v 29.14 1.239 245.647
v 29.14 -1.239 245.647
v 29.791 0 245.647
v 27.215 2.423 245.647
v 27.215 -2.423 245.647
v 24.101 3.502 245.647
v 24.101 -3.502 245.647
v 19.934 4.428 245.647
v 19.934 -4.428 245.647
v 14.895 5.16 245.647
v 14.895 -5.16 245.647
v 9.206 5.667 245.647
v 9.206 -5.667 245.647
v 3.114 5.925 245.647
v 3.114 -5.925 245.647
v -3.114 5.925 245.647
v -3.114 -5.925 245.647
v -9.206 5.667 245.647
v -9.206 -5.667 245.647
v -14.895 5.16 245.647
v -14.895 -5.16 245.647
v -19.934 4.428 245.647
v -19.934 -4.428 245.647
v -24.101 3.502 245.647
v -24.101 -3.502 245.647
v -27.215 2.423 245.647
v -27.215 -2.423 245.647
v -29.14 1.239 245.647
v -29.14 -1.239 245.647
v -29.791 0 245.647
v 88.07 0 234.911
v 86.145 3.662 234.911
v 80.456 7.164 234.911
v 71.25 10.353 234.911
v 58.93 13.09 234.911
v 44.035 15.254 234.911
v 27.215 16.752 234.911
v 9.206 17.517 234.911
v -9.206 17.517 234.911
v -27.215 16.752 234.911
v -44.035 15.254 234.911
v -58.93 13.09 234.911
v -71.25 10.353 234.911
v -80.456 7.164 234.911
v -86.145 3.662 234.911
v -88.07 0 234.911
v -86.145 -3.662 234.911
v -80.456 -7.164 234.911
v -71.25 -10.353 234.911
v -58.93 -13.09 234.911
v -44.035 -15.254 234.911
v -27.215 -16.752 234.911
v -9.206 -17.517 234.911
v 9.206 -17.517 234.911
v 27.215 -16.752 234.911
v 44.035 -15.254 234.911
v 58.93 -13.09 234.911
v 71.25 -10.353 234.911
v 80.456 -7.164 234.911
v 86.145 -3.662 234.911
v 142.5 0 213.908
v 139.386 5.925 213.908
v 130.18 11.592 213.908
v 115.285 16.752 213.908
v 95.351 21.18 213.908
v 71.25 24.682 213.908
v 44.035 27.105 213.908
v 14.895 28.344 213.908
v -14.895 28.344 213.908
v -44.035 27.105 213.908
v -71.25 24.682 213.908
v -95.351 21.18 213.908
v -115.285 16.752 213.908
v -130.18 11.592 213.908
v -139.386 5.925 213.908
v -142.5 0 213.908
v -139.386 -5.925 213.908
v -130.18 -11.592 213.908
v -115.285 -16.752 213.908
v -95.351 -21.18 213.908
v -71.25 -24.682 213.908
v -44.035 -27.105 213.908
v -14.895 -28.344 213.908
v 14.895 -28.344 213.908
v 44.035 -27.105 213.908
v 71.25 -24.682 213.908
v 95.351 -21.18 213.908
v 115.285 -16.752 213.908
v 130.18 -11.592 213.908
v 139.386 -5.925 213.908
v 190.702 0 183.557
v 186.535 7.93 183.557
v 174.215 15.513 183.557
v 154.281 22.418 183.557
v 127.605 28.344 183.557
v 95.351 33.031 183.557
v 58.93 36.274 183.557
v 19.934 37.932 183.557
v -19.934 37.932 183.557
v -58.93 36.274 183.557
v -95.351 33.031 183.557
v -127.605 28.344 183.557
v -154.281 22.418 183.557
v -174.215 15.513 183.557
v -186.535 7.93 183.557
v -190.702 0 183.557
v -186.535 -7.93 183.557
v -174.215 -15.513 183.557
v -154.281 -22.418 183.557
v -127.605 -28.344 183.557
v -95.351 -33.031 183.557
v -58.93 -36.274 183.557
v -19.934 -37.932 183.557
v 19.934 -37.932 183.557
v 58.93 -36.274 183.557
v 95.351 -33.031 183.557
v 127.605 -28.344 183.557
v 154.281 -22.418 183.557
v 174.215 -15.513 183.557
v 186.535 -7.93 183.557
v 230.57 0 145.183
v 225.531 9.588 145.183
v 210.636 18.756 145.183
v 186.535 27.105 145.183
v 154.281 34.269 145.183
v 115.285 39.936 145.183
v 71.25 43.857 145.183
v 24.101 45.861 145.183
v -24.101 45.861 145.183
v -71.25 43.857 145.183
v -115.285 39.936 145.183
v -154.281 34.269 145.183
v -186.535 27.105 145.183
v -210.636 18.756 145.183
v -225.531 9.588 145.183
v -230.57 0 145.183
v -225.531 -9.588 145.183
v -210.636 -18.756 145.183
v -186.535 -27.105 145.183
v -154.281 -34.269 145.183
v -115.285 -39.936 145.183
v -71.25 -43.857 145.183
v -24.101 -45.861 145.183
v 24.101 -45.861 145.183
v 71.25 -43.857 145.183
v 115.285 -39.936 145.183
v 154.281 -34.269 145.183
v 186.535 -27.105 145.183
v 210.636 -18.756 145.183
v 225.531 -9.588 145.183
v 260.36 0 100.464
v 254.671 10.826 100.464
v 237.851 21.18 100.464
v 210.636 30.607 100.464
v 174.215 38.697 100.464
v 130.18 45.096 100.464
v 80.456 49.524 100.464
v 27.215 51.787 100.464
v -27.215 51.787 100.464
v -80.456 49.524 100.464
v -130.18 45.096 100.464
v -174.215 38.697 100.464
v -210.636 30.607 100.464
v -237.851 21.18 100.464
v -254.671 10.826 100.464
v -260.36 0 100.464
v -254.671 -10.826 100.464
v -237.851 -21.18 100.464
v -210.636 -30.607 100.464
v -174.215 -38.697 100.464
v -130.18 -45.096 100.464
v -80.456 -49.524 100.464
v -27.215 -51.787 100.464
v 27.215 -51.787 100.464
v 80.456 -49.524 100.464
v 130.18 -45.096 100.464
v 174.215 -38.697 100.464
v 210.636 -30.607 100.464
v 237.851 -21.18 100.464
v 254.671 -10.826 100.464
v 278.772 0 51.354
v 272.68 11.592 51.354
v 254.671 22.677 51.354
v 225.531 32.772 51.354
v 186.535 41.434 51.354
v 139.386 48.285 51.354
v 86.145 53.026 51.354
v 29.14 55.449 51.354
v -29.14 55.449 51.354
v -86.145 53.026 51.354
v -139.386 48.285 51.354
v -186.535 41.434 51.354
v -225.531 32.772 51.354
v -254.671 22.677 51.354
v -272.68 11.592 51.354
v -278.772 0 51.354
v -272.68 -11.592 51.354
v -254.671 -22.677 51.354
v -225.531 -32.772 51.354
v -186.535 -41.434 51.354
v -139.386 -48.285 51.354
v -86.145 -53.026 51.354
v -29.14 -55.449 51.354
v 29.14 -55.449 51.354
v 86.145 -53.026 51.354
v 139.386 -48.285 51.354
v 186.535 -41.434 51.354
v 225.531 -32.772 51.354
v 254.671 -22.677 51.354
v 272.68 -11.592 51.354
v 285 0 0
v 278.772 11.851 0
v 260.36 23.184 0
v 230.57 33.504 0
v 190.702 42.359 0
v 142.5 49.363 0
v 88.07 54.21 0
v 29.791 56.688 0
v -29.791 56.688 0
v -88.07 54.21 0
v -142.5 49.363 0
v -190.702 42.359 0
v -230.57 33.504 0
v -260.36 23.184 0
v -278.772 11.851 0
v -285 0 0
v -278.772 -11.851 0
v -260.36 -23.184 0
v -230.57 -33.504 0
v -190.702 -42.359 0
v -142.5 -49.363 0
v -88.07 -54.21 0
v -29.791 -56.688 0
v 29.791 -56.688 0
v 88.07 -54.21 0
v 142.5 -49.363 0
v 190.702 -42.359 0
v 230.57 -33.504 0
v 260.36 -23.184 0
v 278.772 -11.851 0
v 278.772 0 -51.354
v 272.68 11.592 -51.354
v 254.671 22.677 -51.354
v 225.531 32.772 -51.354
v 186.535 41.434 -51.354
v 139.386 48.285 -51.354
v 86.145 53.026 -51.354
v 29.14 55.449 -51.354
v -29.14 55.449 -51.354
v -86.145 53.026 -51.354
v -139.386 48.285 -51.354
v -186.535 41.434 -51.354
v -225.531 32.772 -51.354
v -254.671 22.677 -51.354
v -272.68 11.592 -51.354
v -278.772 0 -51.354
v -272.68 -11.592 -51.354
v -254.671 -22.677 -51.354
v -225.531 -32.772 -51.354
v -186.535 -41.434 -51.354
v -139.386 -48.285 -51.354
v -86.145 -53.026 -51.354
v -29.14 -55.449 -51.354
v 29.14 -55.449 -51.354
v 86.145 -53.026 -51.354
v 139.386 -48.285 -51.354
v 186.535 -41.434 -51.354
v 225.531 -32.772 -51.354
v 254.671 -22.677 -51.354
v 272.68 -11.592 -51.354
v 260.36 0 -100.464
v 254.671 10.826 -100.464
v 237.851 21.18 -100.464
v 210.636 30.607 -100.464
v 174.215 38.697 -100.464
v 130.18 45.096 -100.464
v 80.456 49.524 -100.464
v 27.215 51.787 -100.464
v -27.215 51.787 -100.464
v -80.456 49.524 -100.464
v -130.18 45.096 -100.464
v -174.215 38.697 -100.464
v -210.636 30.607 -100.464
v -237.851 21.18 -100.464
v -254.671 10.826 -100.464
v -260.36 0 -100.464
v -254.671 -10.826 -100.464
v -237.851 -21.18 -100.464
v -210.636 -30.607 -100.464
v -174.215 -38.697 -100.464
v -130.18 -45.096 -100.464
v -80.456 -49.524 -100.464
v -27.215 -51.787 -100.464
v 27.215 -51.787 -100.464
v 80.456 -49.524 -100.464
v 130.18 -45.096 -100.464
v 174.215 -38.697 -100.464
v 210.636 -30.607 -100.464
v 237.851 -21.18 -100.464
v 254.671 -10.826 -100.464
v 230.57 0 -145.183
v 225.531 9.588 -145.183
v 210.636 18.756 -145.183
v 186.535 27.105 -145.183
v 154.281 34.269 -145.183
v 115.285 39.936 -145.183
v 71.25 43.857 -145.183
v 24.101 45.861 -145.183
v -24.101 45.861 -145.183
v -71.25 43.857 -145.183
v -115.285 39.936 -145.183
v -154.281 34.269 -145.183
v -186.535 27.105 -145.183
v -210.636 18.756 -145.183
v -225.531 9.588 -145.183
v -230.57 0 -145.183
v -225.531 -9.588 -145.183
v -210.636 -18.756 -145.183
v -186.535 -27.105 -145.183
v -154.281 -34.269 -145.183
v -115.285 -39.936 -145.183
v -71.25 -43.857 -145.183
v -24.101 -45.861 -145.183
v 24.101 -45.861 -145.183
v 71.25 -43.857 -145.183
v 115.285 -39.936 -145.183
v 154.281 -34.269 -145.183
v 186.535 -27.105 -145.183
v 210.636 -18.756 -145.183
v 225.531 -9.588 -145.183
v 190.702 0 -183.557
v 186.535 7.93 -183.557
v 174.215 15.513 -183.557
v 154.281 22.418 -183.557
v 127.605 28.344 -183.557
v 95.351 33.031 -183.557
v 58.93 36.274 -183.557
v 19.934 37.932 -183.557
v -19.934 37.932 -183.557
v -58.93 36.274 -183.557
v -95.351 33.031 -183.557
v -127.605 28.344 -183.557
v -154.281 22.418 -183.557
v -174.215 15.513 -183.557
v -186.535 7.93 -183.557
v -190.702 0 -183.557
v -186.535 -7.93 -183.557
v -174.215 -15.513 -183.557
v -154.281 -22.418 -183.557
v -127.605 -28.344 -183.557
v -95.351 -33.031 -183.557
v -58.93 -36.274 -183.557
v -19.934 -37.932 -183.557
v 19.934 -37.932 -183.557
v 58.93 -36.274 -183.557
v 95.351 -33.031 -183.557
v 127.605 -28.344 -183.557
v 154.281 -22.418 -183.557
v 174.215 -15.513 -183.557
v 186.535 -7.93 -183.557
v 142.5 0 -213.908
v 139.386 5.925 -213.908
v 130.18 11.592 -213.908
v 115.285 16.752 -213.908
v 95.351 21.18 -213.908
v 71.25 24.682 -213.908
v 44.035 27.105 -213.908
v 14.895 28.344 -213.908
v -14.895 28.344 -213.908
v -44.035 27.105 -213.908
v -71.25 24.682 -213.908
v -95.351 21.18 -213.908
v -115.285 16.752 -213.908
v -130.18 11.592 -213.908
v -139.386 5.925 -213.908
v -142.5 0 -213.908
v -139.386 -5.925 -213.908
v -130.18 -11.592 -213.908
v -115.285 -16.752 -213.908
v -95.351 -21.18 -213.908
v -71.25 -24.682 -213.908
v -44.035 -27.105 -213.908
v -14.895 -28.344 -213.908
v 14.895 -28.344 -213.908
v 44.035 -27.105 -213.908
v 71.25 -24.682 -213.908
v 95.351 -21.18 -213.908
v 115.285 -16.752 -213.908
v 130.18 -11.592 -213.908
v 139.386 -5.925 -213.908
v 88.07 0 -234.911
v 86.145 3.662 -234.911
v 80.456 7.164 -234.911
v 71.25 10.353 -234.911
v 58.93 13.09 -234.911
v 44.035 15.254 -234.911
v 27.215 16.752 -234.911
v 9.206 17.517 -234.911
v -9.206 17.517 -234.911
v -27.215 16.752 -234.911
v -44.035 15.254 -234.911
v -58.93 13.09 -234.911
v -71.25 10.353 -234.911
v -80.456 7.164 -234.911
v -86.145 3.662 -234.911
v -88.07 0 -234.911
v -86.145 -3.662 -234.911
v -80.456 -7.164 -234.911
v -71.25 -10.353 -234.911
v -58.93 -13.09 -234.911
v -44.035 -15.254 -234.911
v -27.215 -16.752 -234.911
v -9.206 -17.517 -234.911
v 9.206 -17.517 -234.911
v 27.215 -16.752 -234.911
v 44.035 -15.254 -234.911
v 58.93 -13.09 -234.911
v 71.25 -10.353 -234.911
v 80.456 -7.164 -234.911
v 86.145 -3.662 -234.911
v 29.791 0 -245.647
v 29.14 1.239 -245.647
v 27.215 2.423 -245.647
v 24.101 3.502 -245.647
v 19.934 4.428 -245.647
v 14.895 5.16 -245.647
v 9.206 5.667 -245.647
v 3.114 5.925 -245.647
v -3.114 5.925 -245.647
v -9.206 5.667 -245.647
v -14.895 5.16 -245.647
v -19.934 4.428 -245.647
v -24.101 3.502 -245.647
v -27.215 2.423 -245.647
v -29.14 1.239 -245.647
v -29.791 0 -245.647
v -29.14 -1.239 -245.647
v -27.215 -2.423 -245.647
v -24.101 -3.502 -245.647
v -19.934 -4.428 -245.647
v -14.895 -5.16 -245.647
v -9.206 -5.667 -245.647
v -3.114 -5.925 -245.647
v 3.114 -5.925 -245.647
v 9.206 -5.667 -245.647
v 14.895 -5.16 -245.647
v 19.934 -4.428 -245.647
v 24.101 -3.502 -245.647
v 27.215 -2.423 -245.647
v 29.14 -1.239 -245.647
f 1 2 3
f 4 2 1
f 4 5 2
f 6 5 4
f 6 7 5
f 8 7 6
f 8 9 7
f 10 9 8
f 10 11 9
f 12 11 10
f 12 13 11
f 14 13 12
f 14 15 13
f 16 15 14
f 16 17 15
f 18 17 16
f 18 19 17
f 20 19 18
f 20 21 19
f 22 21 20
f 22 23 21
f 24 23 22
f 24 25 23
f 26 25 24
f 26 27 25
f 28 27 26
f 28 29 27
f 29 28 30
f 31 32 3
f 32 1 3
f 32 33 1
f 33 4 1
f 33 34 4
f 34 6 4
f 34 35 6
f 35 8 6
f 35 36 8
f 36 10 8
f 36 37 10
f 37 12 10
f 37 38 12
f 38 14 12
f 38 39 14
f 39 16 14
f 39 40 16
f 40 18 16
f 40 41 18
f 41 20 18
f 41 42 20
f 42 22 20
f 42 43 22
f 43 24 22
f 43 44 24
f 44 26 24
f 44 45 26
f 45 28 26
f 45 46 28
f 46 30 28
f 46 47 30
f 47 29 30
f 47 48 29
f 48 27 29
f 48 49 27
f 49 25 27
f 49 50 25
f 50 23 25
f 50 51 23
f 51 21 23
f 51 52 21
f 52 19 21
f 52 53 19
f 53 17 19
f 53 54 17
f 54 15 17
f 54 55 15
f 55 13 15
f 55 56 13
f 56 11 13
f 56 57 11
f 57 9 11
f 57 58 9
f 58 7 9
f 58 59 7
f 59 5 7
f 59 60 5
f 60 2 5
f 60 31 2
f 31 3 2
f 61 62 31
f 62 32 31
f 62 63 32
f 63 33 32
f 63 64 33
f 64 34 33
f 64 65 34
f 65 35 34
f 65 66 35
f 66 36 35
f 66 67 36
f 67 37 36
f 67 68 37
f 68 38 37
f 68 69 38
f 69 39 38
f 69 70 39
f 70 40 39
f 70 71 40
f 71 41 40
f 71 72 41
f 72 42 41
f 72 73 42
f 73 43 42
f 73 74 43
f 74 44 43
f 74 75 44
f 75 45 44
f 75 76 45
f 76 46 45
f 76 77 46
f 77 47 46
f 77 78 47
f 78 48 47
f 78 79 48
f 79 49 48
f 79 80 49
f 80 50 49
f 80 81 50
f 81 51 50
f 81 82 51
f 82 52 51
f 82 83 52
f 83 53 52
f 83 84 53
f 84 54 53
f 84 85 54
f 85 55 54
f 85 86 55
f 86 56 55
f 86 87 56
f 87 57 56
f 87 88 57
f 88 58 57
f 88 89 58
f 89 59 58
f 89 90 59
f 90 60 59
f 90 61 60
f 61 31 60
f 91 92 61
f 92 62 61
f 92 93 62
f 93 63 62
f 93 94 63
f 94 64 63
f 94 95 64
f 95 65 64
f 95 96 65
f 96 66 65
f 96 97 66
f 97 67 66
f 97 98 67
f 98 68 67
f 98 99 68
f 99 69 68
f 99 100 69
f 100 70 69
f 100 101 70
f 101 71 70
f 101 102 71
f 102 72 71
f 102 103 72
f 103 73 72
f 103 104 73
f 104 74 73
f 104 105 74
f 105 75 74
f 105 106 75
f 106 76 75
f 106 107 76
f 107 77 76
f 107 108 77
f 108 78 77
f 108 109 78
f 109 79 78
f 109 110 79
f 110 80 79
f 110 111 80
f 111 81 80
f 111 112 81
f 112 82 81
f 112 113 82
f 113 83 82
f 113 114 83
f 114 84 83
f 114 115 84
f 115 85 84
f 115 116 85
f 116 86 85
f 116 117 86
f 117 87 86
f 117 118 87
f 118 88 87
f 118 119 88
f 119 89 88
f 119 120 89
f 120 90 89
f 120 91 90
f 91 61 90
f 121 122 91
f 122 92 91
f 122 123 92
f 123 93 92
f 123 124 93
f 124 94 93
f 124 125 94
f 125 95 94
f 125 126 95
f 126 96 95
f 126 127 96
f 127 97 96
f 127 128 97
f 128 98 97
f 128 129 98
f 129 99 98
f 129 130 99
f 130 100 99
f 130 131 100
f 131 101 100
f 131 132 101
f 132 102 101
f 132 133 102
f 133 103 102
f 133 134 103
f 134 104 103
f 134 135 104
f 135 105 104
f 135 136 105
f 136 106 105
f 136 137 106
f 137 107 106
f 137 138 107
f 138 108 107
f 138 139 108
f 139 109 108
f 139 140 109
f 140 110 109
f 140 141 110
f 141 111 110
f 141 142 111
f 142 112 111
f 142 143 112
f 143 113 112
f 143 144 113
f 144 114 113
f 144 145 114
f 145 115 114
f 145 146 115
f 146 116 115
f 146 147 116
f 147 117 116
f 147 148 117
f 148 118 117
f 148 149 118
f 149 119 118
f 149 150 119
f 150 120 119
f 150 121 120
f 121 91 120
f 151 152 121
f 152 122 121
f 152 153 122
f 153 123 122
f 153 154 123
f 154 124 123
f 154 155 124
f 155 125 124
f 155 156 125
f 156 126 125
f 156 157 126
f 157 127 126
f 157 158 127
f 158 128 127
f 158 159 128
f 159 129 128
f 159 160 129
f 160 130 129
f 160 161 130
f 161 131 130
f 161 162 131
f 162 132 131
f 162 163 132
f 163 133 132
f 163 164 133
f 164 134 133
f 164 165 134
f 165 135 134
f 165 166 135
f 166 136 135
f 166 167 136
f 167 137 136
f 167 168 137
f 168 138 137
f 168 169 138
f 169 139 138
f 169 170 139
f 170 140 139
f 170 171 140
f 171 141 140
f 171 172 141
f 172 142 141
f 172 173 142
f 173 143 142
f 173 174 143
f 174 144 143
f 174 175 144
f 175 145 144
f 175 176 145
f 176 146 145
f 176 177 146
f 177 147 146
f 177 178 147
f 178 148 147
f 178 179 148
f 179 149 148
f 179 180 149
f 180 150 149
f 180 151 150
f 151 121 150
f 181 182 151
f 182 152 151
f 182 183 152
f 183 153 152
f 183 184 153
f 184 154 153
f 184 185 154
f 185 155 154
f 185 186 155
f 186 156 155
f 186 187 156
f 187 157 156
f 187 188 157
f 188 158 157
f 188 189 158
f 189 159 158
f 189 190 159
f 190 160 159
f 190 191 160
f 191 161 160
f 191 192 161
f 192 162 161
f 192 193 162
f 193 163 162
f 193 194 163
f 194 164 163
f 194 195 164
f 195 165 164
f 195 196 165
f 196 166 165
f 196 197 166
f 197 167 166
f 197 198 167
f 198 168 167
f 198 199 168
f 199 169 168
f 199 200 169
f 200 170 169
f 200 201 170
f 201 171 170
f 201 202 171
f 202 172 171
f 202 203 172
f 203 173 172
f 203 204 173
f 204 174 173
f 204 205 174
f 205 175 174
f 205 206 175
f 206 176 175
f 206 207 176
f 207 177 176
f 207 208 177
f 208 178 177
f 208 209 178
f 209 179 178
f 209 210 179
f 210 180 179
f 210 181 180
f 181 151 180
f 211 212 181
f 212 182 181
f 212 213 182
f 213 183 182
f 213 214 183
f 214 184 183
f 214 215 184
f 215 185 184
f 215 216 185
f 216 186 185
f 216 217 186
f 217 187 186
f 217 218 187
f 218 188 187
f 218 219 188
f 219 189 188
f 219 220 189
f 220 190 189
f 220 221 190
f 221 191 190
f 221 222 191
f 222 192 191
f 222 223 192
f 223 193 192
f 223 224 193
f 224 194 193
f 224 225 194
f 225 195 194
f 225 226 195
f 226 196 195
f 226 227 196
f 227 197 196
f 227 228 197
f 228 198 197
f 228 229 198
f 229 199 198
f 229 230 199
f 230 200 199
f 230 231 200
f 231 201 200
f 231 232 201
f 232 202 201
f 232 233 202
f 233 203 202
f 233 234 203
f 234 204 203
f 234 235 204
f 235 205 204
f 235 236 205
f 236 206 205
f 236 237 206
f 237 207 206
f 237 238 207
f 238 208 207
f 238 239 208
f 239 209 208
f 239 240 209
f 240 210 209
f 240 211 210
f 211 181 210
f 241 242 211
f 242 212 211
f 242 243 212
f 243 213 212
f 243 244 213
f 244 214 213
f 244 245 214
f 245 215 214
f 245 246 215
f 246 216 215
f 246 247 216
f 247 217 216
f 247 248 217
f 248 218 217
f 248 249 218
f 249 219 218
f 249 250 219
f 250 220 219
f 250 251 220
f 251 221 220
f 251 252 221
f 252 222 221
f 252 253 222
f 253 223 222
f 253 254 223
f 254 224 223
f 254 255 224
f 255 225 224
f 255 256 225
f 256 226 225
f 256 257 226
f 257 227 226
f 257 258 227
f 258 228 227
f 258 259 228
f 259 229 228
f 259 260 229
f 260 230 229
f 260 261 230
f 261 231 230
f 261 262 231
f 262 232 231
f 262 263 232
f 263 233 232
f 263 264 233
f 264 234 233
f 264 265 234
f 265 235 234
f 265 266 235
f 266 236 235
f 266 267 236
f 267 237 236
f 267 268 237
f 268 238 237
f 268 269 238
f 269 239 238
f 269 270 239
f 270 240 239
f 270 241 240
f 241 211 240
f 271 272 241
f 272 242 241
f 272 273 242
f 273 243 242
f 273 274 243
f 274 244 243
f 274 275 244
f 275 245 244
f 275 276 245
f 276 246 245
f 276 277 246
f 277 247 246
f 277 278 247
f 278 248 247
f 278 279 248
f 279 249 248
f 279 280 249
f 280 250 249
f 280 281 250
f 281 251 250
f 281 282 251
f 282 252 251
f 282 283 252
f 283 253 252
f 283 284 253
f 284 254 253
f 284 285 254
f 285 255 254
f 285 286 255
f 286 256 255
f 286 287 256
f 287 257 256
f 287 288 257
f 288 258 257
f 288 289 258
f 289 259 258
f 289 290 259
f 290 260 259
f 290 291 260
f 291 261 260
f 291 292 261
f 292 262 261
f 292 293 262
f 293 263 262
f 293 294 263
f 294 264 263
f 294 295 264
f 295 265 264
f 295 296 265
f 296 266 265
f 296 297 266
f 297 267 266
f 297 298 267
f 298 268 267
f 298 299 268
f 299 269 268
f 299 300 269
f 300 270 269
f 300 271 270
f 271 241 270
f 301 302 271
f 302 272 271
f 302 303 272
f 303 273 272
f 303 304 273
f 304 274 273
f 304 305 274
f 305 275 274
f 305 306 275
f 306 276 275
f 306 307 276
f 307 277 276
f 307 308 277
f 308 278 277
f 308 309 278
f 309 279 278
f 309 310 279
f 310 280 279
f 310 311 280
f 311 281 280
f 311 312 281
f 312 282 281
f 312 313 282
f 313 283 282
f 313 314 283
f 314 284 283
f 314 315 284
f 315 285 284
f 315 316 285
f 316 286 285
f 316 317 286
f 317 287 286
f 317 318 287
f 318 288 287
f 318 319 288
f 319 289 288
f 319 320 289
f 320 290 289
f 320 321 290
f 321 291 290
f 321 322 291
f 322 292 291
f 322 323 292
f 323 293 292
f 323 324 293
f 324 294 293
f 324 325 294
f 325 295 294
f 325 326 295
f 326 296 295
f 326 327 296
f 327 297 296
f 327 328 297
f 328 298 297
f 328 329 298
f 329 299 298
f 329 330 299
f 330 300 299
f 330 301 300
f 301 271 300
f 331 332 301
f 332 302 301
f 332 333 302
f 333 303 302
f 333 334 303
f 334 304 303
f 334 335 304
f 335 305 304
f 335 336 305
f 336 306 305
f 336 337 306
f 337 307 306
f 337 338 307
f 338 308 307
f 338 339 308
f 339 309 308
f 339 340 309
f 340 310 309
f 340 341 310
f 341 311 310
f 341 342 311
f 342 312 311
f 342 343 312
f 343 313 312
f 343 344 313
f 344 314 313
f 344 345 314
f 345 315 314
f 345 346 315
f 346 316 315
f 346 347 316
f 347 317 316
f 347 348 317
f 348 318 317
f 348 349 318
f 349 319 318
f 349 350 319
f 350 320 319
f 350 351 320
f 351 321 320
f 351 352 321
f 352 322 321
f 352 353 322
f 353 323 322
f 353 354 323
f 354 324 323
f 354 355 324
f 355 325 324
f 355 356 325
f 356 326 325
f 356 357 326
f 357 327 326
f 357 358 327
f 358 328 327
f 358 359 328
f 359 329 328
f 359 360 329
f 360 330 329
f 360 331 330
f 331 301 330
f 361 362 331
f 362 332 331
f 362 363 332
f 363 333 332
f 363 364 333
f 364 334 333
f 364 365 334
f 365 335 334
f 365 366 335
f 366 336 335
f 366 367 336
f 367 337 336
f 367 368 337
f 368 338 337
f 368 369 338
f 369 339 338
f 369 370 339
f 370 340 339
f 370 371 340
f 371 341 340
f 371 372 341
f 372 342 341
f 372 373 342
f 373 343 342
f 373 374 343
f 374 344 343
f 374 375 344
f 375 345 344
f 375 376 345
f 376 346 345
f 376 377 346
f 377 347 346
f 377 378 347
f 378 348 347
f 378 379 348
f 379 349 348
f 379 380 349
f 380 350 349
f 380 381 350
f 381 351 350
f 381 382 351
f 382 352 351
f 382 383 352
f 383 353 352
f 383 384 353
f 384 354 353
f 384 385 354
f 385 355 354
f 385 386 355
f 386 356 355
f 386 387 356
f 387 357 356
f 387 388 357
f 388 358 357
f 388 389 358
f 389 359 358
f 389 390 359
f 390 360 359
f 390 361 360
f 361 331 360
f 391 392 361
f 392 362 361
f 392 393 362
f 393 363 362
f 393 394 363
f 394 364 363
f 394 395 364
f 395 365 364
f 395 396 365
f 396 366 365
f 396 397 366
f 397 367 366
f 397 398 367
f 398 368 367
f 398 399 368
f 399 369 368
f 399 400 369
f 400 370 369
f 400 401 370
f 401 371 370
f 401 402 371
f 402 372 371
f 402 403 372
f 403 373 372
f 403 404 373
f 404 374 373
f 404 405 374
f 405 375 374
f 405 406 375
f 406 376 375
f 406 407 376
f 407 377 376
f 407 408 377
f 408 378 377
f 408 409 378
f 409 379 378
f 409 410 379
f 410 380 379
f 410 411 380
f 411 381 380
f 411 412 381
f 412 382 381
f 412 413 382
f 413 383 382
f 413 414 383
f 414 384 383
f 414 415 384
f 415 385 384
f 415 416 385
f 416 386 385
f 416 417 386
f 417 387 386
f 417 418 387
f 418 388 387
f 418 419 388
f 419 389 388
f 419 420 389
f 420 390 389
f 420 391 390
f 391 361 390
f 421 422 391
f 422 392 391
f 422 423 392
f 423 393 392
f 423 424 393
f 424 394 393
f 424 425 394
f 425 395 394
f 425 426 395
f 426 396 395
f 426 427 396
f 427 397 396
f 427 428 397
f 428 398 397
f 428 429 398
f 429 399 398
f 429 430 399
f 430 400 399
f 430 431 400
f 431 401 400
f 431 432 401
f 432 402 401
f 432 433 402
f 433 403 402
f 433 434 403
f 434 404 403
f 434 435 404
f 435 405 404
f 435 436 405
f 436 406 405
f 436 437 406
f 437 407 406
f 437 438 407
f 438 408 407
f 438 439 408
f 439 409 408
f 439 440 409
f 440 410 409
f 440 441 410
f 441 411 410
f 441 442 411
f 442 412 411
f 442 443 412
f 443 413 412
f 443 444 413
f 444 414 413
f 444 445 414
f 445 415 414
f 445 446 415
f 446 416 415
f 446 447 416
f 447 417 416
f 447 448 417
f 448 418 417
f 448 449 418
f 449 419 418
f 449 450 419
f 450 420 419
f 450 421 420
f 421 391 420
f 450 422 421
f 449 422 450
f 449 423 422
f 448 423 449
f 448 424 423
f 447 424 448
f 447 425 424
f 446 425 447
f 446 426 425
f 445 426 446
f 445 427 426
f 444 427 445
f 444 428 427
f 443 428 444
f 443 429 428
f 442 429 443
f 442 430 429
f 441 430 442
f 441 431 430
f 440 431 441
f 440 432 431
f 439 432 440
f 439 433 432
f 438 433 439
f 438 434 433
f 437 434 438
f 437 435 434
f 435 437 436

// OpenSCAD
// Generated by SolidPython 1.0.1 on 2020-07-29 00:46:51


scale(v = [15, 3, 13]) {
	sphere(r = 19);
}
/***********************************************
*********      SolidPython code:      **********
************************************************
 
# import packages: SolidPython
from solid import *
from solid.utils import *
from itertools import chain, combinations, permutations


class Resize:

    def __init__(self, scad_file):
        self.scad_file = scad_file
        #self.scad_file = import_scad(scad_file)
        # cone/cylinder param:
        self.r1 = 0
        self.r2 = 0
        self.h = 0
        # rectangular prism param:
        self.w = 0
        self.l = 0
        # ellipse param:
        self.r = 0

    # import OpenScad code (file name corresponds to shape)


    # classify shape + parameters
    def assign(self, param1, param2, param3):
        if self.scad_file == 'cone.scad':
            self.r1 = param1
            self.r2 = param2
            self.h = param3
        elif self.scad_file == 'cylinder.scad':
            self.r1 = param1
            self.r2 = param2
            self.h = param3
        elif self.scad_file == 'rectangularPrism.scad':
            self.h = param1
            self.l = param2
            self.w = param3
        else:
            self.r = param1
            self.h = param2

    # resize parameters
    def iterate(self):
        x = range(3, 20, 2)
        i = 1
        if self.scad_file == 'cone.scad':
            tempList = list(permutations(x, 2))
            for temp in tempList:
                param1 = temp[0]
                param2 = temp[1]
                filepath = 'produced_scad_files/' + 'cone' + str(param1) + '_' + str(param2) + '_' + '.scad'
                scad_render_to_file(cylinder(h=param1, r1=param2, r2=0), filepath)

        elif self.scad_file == 'cylinder.scad':
            tempList = list(permutations(x, 3))
            for temp in tempList:
                param1 = temp[0]
                param2 = temp[1]
                filepath = 'produced_scad_files/' + 'cylinder' + str(param1) + '_' + str(param2) + '_' + '.scad'
                scad_render_to_file(cylinder(h=param1, r1=param2, r2=param2), filepath)

        elif self.scad_file == 'rectangularPrism.scad':
            tempList = list(permutations(x, 3))
            for temp in tempList:
                param1 = temp[0]
                param2 = temp[1]
                param3 = temp[2]
                filepath = 'produced_scad_files/' + 'rectangularPrism' + str(param1) + '_' + str(param2) + '_' + str(
                    param3) + '.scad'
                scad_render_to_file(cube(size=(param1, param2, param3)), filepath)

        elif self.scad_file == 'ellipse.scad':
            tempList = list(permutations(x, 4))
            for temp in tempList:
                param1 = temp[0]
                param2 = temp[1]
                param3 = temp[2]
                param4 = temp[3]
                filepath = 'produced_scad_files/' + 'ellipse' + str(param1) + '_' + str(param2) + '_' + str(param3) + '_' + str(param4) + '.scad'
                scad_render_to_file(scale([param1, param2, param3])(sphere(r=param4)), filepath)

    def render_to_scadfile(self):
        scad_render_to_file(scad, 'example.scad') 
 
************************************************/
